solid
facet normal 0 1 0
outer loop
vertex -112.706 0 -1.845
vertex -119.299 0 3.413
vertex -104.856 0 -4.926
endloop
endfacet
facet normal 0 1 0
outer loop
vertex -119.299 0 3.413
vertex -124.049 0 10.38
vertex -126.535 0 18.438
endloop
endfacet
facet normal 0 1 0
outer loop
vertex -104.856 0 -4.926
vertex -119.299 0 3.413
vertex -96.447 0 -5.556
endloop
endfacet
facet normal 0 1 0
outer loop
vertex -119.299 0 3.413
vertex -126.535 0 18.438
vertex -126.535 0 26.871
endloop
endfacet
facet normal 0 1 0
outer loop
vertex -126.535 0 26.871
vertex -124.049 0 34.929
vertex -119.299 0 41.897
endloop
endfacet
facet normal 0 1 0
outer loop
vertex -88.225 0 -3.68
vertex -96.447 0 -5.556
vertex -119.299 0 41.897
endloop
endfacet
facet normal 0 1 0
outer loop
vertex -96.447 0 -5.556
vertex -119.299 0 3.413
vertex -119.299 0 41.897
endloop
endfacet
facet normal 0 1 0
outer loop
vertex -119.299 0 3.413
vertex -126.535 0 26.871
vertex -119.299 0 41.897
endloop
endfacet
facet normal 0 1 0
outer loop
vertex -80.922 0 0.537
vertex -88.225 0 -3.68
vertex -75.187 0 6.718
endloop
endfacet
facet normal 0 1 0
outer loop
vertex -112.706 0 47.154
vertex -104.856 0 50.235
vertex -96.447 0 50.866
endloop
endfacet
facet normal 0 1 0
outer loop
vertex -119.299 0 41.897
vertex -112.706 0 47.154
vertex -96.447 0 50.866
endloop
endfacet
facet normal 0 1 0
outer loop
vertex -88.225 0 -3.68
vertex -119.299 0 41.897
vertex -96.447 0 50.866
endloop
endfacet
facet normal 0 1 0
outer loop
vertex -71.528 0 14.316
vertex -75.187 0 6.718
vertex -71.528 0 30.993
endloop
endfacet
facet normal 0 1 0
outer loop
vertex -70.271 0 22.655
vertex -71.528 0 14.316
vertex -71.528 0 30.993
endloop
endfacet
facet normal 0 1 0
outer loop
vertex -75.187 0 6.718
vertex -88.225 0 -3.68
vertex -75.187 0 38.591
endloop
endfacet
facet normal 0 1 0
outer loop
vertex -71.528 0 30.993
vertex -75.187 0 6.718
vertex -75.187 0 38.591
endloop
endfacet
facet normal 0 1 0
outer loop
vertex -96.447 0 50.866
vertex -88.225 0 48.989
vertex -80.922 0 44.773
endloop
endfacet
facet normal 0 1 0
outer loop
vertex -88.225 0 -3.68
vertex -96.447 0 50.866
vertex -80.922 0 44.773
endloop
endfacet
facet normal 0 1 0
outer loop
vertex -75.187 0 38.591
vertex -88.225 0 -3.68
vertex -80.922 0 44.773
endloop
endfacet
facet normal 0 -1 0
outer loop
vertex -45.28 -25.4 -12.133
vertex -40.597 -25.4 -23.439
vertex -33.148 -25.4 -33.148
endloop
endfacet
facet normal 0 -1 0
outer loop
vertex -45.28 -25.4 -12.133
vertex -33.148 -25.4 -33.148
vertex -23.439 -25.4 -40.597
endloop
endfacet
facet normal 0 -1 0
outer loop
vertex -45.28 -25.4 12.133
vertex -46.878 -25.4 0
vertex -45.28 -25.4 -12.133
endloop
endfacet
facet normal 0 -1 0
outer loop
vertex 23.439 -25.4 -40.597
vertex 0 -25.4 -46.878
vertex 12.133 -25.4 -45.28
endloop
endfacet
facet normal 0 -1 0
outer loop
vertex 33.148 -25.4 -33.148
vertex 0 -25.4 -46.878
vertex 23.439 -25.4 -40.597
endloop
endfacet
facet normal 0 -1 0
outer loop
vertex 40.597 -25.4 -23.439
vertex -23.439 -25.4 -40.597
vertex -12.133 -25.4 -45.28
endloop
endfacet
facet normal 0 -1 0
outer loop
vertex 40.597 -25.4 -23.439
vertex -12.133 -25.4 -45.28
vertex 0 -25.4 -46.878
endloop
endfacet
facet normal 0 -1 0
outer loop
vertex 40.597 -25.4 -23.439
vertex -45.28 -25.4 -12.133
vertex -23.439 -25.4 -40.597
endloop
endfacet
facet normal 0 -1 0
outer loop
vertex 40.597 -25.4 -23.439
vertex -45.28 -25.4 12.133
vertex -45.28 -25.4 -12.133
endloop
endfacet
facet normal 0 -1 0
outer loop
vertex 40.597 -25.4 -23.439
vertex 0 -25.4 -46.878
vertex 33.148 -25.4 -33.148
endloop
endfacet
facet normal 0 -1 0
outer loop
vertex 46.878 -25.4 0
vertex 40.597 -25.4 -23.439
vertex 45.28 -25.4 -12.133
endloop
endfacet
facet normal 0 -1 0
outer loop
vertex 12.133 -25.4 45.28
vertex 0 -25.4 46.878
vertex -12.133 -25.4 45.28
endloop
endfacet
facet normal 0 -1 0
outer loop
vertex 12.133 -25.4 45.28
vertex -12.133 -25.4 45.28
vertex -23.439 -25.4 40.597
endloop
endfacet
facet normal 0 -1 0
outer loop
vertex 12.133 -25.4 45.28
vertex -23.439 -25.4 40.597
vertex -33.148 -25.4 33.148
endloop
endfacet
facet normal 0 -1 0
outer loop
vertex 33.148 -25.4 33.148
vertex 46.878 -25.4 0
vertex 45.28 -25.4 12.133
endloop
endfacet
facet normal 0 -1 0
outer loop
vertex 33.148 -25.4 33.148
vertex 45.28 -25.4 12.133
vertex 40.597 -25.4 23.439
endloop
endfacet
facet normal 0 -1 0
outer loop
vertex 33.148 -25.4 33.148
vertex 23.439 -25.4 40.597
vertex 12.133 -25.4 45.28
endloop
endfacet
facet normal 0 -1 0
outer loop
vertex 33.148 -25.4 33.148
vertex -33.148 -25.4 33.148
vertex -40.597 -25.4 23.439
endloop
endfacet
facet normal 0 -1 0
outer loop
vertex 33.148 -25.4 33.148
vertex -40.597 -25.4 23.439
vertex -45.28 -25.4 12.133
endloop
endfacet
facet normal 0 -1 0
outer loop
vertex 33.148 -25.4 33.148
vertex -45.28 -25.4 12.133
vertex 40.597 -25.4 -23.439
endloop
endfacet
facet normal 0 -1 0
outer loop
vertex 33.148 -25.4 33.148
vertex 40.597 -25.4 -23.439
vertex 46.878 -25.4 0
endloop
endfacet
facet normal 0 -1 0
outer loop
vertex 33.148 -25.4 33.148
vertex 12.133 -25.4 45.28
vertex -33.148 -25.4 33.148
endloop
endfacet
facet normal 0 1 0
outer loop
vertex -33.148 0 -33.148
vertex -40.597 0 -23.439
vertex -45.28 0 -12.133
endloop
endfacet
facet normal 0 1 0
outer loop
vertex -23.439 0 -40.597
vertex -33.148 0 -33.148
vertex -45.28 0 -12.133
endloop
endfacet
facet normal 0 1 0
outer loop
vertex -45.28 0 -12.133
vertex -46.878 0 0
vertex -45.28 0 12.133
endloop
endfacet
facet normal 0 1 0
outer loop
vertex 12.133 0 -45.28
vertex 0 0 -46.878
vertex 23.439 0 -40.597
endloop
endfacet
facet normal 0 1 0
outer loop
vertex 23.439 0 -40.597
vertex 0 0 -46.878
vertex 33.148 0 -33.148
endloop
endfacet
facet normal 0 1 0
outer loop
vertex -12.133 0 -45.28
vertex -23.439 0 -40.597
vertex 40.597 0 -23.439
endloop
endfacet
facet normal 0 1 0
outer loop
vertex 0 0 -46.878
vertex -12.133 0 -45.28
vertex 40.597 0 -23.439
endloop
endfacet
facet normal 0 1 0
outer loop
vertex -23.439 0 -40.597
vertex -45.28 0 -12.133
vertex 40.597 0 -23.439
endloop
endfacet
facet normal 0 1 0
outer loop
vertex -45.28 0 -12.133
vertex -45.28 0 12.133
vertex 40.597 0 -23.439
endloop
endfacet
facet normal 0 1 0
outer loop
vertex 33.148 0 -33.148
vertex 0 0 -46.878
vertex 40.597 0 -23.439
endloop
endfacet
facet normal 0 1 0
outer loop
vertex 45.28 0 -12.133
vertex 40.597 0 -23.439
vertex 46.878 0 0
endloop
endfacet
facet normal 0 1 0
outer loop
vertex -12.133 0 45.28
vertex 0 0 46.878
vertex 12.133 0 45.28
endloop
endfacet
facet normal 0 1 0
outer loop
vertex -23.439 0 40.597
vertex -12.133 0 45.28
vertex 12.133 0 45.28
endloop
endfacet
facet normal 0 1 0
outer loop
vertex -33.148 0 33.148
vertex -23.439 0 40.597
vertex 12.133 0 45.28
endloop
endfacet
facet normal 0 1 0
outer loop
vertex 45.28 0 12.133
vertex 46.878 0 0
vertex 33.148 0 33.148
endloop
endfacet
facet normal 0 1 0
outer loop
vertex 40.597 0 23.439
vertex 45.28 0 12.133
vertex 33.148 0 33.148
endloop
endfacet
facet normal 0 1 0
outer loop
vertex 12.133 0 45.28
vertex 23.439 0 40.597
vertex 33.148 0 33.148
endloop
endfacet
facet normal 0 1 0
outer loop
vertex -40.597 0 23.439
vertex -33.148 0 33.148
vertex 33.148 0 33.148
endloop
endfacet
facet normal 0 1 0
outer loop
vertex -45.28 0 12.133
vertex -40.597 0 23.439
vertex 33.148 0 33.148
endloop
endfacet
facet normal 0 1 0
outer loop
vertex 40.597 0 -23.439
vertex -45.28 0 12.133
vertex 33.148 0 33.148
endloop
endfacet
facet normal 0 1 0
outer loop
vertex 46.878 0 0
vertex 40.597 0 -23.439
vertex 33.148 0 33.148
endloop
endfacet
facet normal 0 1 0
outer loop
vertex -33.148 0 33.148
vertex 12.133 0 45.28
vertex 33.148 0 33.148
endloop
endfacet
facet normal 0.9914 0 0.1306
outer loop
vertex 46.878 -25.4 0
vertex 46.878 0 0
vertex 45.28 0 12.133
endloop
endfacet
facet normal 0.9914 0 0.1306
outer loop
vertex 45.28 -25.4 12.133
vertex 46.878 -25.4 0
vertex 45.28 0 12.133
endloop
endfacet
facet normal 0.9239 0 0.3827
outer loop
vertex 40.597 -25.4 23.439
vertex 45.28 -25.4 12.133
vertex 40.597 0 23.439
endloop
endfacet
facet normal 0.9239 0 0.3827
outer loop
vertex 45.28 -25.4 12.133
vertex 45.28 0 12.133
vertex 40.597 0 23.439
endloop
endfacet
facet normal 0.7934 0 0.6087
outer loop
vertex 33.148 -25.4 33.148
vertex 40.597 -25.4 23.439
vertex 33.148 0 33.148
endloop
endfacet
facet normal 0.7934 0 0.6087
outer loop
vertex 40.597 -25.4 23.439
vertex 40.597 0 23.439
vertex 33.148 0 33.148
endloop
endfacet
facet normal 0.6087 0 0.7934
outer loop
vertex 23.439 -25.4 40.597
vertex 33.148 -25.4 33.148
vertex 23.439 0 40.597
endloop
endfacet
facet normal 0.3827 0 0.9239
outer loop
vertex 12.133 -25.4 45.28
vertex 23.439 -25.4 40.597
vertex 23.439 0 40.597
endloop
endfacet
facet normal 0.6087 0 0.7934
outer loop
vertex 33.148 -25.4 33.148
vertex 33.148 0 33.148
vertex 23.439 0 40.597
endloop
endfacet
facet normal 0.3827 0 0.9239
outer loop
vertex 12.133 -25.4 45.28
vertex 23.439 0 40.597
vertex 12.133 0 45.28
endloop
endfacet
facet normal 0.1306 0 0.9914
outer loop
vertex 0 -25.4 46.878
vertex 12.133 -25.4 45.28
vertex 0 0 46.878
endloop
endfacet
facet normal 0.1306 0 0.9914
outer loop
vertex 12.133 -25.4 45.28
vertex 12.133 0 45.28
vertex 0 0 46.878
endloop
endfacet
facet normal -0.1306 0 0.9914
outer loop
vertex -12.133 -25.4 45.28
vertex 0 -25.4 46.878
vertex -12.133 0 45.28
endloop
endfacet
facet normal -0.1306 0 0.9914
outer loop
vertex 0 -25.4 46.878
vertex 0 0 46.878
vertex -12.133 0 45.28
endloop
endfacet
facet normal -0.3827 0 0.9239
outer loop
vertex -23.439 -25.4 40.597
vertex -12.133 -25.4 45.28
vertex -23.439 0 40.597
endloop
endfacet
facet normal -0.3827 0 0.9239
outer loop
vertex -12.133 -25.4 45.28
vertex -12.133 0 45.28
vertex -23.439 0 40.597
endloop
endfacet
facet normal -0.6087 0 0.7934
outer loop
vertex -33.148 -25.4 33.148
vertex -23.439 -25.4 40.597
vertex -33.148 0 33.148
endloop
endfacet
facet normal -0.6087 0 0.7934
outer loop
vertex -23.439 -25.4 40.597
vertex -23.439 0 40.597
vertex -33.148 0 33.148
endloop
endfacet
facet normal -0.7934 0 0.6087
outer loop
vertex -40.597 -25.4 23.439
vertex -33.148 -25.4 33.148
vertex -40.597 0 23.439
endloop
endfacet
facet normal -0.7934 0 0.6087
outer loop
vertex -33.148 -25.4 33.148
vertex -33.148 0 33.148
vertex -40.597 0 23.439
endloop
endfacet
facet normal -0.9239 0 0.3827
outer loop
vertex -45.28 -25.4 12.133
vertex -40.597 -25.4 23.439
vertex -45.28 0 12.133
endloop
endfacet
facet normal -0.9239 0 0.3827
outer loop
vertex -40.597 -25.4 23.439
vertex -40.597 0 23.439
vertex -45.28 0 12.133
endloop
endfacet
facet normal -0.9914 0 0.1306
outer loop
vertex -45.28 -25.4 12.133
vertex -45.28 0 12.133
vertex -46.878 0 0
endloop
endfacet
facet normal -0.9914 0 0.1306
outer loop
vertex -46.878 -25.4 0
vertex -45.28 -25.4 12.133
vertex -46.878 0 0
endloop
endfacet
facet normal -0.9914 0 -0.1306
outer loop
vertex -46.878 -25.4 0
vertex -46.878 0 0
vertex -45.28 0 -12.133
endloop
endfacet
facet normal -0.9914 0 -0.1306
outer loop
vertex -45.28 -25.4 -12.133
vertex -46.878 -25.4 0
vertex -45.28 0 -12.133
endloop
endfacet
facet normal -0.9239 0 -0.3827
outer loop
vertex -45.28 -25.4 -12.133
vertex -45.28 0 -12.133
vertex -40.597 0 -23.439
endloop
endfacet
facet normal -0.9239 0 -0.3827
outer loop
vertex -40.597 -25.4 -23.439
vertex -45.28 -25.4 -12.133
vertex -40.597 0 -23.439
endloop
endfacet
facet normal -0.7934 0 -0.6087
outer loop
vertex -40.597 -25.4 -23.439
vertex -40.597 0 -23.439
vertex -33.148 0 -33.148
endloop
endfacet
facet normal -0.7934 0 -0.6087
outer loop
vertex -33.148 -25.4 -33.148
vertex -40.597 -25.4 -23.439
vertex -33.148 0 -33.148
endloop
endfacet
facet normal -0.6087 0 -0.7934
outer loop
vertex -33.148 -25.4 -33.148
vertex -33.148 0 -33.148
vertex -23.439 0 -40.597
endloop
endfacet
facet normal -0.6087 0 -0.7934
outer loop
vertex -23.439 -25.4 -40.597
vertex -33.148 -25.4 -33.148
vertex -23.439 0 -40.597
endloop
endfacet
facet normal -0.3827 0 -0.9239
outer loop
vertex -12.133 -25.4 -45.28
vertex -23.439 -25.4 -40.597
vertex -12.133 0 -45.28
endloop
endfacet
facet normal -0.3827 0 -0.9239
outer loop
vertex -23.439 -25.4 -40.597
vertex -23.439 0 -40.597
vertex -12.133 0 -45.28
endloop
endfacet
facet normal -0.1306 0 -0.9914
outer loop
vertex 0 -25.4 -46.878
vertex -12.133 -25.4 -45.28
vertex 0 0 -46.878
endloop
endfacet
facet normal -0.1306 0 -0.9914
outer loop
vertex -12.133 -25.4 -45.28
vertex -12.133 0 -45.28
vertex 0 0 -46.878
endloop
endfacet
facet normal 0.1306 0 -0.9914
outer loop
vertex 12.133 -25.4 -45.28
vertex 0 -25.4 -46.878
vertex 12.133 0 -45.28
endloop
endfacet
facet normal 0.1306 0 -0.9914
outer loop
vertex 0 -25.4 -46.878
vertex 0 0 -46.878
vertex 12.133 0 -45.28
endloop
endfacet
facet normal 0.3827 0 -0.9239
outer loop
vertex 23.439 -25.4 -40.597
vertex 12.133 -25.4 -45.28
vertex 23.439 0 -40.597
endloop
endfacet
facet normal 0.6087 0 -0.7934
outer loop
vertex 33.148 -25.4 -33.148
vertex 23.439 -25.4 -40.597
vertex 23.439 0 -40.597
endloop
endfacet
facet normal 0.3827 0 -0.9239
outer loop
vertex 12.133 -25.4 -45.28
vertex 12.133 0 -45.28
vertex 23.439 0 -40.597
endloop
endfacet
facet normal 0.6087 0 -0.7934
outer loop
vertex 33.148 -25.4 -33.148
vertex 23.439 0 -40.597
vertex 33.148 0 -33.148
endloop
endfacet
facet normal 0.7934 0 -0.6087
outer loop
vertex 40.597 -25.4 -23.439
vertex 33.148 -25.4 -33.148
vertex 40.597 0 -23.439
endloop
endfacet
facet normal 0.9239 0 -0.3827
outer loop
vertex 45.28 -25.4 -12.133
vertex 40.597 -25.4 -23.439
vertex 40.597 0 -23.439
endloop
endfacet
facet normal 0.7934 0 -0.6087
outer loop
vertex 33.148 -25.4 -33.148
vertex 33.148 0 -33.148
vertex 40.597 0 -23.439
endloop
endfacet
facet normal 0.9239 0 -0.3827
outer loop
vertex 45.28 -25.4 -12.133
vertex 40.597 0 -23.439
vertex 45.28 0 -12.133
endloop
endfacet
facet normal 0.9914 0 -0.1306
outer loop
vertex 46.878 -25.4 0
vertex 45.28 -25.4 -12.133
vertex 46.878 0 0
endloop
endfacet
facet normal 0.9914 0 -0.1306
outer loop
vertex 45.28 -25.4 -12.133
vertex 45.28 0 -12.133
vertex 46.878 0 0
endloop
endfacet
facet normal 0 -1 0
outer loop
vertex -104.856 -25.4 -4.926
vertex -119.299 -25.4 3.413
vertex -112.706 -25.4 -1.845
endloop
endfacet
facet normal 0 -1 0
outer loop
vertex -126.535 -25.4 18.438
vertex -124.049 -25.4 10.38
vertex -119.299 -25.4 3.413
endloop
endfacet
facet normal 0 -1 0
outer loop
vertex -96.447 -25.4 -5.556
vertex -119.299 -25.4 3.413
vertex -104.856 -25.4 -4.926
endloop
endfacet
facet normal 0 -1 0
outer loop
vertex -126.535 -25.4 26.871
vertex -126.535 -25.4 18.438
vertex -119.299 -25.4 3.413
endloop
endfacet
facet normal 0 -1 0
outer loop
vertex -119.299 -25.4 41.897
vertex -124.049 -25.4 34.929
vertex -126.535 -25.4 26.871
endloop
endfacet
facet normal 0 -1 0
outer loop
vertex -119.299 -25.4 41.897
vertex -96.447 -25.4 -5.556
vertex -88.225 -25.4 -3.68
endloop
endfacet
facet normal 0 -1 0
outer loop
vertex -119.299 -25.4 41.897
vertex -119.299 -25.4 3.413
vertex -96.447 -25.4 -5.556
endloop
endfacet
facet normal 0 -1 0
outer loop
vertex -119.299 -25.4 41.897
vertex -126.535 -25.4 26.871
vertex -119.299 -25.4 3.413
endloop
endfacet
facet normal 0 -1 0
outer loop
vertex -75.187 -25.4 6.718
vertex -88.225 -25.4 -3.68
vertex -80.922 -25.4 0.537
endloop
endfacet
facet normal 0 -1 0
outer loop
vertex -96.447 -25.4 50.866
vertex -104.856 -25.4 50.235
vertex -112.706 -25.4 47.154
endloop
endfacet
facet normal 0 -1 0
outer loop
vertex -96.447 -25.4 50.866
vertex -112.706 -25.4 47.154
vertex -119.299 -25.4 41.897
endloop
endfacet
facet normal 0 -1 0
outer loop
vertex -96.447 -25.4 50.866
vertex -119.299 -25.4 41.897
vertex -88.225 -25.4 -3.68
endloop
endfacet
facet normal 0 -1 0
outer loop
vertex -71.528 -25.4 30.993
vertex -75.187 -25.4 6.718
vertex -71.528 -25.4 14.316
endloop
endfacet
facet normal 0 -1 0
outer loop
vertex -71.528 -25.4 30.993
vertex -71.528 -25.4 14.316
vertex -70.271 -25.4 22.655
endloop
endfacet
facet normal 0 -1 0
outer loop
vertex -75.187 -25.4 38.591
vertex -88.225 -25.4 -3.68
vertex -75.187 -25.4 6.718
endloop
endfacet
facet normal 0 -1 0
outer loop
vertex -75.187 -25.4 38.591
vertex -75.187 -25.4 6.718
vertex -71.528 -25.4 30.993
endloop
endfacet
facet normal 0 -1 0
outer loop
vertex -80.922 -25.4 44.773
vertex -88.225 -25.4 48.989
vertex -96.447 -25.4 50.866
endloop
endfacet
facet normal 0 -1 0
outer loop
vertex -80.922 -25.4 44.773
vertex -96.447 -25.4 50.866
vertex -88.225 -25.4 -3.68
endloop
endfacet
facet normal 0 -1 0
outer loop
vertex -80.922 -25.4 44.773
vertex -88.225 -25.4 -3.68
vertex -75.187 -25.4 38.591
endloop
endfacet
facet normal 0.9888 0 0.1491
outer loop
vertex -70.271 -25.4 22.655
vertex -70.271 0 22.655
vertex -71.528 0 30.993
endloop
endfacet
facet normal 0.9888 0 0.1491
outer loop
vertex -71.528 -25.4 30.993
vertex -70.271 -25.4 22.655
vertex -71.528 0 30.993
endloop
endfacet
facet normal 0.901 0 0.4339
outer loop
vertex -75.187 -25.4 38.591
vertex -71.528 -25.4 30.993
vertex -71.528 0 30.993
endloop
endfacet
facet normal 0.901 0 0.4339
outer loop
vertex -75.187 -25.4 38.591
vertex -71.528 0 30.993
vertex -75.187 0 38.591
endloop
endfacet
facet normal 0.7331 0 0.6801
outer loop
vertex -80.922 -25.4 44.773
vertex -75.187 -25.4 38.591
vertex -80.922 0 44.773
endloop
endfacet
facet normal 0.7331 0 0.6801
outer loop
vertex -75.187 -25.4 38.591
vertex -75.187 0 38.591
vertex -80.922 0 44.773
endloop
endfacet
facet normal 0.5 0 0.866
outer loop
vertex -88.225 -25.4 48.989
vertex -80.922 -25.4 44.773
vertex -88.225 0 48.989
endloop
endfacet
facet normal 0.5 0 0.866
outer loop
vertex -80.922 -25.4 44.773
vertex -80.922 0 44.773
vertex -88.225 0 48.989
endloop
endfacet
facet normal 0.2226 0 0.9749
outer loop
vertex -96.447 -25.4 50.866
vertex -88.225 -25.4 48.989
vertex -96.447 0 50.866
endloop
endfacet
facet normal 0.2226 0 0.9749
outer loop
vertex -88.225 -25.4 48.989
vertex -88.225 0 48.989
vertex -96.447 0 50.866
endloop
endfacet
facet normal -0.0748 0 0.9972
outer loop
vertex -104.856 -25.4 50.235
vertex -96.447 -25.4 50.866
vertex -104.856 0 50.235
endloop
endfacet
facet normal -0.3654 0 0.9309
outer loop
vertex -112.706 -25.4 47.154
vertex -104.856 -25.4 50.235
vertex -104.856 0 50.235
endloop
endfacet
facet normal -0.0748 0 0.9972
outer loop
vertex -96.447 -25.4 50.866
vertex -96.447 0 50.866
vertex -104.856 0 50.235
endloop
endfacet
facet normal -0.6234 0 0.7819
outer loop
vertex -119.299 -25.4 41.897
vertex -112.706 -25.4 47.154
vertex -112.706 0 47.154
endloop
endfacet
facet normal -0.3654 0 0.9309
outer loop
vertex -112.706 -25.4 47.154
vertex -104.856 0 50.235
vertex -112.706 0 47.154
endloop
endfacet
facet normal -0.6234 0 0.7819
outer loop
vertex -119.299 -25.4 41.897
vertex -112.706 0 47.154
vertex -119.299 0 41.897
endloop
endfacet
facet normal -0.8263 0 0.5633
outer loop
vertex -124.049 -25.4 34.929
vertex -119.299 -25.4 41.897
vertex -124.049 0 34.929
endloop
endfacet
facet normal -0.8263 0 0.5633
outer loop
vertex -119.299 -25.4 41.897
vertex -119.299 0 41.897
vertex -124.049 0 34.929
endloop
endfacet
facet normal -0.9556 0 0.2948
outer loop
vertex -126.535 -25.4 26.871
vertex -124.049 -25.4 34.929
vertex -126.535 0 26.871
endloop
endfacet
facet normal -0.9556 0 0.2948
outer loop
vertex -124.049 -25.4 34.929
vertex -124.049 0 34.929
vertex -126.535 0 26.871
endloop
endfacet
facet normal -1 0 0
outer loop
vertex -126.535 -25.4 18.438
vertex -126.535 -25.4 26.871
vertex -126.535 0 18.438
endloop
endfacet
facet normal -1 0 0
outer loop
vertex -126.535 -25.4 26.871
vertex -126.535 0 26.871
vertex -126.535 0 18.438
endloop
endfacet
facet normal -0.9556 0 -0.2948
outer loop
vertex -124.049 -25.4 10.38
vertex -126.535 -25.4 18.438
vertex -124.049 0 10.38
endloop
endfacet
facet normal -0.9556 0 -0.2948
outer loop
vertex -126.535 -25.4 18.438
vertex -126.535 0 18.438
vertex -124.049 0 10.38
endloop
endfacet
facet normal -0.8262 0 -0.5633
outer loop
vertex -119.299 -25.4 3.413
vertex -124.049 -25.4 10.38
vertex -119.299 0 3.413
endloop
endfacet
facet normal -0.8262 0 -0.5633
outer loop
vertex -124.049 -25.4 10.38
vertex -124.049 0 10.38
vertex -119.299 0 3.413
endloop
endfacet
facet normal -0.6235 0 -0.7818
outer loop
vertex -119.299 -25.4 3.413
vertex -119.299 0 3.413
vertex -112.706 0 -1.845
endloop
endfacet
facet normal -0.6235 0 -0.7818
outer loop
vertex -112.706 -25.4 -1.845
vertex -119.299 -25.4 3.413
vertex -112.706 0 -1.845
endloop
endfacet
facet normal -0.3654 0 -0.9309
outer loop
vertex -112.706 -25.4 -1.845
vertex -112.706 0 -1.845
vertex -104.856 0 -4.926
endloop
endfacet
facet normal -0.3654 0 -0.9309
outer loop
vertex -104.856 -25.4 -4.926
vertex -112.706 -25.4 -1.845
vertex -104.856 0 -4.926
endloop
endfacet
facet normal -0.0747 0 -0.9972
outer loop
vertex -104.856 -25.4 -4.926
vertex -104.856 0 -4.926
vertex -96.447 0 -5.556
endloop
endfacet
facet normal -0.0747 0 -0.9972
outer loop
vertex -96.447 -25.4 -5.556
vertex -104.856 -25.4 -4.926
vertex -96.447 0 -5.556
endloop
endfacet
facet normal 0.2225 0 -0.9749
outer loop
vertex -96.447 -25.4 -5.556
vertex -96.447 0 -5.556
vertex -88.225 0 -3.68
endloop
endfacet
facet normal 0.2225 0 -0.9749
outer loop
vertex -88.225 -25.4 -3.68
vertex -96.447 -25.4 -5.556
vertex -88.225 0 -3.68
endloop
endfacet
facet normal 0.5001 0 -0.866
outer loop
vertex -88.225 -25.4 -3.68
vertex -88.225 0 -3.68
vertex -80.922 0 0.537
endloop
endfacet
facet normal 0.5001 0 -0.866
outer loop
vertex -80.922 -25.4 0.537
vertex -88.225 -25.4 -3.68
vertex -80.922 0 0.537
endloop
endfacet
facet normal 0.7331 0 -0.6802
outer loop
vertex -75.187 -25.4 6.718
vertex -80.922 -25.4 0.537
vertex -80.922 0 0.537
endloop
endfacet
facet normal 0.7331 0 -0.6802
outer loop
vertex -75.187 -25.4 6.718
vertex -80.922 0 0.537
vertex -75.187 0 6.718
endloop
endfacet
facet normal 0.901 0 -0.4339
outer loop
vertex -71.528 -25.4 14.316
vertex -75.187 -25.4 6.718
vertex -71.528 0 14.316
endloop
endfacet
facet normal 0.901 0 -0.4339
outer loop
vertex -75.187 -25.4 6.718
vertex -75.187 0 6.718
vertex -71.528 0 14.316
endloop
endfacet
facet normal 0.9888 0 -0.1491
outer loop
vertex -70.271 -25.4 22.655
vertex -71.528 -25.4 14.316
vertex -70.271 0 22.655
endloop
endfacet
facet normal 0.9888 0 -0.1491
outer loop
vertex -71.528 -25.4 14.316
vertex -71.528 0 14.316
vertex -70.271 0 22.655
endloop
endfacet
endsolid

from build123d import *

# Parameters (mm, degrees)
F1_R     = 24.2731402163
F1_R_2   = 7.8379343963
F2_DEPTH = 25.4
F0_R     = 46.8778023243
F4_DEPTH = 25.4
F5_R     = 28.2899115296
F5_R_2   = 20.4147682213
F5_R_3   = 10.0236326285
F6_DEPTH = 25.4


# Not quite as in the source:
# - the program builds the solid bodies; features that only make, move or delete a surface that nothing else refers to are left out


with BuildPart() as f2:
    # F1 (on Front) → F2 (new body)
    with BuildSketch(Plane.XZ):
        Circle(F1_R)
        Circle(F1_R_2, mode=Mode.SUBTRACT)
    extrude(amount=F2_DEPTH)

    # F0 (on Front) → F4 (join)
    with BuildSketch(Plane.XZ):
        Circle(F0_R)
    extrude(amount=F4_DEPTH)


with BuildPart() as f6:
    # F5 (on Front) → F6 (new body)
    with BuildSketch(Plane.XZ):
        with Locations((-98.5608547926, 22.6546935737)):
            Circle(F5_R)
        with Locations((-98.5608547926, 22.6546935737)):
            Circle(F5_R_2, mode=Mode.SUBTRACT)
        with Locations((-98.5608547926, 22.6546935737)):
            Circle(F5_R_2)
        with Locations((-98.5608547926, 22.6546935737)):
            Circle(F5_R_3, mode=Mode.SUBTRACT)
        with Locations((-98.5608547926, 22.6546935737)):
            Circle(F5_R_3)
    extrude(amount=F6_DEPTH)


solid = Compound([f2.part, f6.part])
